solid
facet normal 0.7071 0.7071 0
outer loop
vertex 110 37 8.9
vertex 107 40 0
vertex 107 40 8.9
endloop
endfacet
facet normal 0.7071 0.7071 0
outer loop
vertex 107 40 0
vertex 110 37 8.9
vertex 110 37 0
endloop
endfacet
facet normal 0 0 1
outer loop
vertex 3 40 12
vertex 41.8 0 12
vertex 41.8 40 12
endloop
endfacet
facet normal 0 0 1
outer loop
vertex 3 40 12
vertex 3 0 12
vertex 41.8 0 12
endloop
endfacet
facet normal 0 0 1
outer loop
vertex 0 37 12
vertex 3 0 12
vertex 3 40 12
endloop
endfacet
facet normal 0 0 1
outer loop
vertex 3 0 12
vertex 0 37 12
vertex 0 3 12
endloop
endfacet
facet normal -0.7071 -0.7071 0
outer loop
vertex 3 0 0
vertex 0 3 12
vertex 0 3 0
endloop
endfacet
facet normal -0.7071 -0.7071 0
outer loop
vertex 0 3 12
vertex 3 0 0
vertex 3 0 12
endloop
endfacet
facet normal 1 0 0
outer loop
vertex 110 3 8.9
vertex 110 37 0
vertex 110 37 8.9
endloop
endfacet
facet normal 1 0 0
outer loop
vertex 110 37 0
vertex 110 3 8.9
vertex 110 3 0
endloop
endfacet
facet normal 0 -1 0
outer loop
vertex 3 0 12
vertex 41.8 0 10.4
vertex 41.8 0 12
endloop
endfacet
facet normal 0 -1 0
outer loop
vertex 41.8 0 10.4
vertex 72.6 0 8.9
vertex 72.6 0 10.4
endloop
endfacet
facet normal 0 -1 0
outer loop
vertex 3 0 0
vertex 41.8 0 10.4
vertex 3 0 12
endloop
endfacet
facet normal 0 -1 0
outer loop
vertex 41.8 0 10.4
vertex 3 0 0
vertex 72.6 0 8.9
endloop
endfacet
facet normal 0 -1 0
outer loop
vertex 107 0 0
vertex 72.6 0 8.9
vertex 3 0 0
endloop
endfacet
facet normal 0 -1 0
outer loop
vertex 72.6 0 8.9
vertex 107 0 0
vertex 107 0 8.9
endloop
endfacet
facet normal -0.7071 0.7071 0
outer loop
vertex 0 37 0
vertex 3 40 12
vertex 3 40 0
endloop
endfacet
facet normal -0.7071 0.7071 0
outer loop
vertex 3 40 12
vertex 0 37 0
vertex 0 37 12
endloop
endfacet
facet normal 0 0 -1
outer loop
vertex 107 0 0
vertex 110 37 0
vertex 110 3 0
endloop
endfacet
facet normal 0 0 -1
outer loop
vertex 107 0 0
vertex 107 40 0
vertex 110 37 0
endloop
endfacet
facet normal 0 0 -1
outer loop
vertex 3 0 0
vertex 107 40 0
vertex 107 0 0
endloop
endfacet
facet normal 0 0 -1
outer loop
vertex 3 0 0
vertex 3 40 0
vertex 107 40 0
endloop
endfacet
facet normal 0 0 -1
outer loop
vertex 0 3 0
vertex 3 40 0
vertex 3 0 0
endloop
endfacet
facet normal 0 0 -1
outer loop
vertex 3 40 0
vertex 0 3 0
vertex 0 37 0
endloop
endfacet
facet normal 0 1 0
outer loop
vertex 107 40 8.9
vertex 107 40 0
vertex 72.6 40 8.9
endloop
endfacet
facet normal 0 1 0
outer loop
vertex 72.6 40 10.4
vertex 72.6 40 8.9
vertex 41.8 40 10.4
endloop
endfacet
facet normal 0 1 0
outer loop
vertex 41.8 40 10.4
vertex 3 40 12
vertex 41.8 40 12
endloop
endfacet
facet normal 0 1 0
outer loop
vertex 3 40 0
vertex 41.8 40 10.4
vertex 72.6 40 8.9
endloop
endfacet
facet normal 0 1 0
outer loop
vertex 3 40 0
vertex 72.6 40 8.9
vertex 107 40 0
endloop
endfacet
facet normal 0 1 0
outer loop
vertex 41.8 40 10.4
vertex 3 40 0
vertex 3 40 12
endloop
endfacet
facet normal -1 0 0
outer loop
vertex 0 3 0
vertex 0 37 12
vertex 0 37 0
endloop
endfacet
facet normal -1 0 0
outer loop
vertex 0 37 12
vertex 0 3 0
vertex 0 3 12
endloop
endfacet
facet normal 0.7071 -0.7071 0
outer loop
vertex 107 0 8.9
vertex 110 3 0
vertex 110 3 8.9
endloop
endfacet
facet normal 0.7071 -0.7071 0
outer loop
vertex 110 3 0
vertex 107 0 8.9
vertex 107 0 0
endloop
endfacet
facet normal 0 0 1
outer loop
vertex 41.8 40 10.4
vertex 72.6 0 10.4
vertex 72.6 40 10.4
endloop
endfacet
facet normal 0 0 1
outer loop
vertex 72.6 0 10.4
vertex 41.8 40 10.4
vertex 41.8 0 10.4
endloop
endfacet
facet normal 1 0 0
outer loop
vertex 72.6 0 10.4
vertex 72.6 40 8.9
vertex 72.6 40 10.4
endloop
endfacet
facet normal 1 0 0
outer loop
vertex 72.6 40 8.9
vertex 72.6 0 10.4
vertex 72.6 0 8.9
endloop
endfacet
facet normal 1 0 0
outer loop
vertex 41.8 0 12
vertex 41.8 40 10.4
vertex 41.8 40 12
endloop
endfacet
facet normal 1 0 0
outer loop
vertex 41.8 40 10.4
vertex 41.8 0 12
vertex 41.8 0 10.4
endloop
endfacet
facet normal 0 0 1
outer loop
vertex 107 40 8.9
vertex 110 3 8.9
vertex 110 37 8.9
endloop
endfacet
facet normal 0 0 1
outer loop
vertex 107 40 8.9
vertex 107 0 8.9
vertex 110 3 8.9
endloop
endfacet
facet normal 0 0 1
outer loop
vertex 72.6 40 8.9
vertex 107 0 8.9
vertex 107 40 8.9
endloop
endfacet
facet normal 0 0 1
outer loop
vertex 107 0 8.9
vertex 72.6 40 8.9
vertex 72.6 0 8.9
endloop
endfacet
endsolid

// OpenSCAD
$fn = 32;

// ----------------------------------------------------------------------
// Stepped bar: twostep, 110 x 40 x 12/8.9 mm
// ----------------------------------------------------------------------

// --- parameters (mm) ---
bar_l = 110;              // bar length, X
bar_w = 40;               // bar width, Y
plate_t = 12;             // thickness of the thick zone, Z
thin_t = 8.9;             // thickness of the thin zone
corner_c = 3;             // corner chamfer of the bar
step_cut = 3.1;           // material removed from the thin zone
stair1_x = 41.8;          // position of the first stair
stair2_x = 72.6;          // position of the second stair
mid_t = 10.4;             // thickness of the middle zone
depth_1 = 1.6;            // depth of cut 1 from the top face
depth_2 = 3.1;            // depth of cut 2 from the top face

profile = [[3, 0], [107, 0], [110, 3], [110, 37], [107, 40], [3, 40], [0, 37], [0, 3]];  // primary outline, 8 points, counter clockwise
void_1 = [[41.8, -1], [72.6, -1], [72.6, 41], [41.8, 41]];  // first stair, 4 points
void_2 = [[72.6, -1], [111, -1], [111, 41], [72.6, 41]];  // second stair, 4 points

// --- the one profile operation ---
difference() {
  linear_extrude(height = plate_t) polygon(points = profile);
  translate([0, 0, plate_t - depth_1])
    linear_extrude(height = depth_1 + 1) polygon(points = void_1);
  translate([0, 0, plate_t - depth_2])
    linear_extrude(height = depth_2 + 1) polygon(points = void_2);
}
